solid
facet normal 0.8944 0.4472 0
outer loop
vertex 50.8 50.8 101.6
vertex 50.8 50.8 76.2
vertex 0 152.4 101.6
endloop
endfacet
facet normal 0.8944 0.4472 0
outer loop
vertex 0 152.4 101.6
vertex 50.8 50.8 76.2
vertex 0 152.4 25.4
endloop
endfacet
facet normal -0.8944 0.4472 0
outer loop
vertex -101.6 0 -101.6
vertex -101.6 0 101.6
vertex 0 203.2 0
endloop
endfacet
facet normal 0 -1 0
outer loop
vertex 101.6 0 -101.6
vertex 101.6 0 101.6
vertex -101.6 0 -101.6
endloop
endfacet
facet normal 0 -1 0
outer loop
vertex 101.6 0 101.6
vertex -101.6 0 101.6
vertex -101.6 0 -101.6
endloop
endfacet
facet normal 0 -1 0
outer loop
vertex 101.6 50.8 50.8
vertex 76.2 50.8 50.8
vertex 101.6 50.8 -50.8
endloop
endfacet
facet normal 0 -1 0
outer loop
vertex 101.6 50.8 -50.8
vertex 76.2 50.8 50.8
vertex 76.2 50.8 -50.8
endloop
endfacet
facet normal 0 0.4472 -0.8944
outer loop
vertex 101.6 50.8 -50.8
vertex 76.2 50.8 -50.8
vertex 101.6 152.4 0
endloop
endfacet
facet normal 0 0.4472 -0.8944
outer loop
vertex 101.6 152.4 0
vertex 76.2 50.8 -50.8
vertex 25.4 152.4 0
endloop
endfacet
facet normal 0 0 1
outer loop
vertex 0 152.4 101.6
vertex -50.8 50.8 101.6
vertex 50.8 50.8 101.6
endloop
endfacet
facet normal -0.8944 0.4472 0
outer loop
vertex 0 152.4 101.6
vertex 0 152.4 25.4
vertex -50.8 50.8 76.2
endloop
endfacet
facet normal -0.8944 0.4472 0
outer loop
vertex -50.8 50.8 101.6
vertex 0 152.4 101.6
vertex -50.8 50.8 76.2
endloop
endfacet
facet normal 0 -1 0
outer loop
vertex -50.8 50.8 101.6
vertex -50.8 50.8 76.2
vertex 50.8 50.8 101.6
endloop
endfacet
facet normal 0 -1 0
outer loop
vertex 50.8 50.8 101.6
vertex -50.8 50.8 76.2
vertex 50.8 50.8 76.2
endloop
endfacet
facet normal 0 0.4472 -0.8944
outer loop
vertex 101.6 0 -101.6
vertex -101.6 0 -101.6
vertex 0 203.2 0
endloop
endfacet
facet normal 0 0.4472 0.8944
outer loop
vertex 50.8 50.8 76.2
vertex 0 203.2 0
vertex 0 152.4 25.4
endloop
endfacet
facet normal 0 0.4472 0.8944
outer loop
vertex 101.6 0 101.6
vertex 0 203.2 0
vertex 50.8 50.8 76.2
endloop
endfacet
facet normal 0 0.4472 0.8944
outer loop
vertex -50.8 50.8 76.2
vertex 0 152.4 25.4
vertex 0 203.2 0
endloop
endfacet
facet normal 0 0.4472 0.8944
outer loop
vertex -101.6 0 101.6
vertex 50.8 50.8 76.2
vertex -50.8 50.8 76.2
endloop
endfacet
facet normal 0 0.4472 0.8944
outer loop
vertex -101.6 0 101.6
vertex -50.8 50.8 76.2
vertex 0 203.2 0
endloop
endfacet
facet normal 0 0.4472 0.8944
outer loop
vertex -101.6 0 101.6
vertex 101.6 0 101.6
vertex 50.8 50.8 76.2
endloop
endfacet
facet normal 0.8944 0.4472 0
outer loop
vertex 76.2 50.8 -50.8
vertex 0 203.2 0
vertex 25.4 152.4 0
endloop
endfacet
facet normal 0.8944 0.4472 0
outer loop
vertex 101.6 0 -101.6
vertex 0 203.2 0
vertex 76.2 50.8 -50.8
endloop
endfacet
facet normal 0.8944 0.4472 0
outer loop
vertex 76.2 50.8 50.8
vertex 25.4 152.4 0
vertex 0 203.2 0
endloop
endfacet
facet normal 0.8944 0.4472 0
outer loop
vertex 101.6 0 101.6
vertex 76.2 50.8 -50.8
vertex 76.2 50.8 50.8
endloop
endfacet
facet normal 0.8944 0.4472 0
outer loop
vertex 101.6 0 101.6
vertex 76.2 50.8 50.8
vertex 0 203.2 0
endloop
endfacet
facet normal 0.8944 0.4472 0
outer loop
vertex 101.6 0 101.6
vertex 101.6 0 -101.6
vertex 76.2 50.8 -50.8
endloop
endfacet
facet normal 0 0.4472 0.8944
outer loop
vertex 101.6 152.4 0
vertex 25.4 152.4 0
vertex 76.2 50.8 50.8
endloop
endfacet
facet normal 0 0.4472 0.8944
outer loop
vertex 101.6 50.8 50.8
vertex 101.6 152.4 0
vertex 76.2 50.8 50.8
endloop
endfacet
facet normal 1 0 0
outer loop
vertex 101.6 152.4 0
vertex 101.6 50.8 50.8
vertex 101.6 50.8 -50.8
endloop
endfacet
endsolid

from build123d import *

# Parameters (mm, degrees)
BOSS_EXTRUDE1_DEPTH   = 101.6
BODY_MOVE_COPY2_ANGLE = 90


with BuildPart() as part:
    # Sketch2 → Loft2 section 0
    with BuildSketch(Plane(origin=(0, 0, 0), x_dir=(1, 0, 0), z_dir=(0, 1, 0)), mode=Mode.PRIVATE) as loft2_s0:
        with BuildLine():
            Line((101.6, -101.6), (-101.6, -101.6))
            Line((-101.6, -101.6), (-101.6, 101.6))
            Line((-101.6, 101.6), (101.6, 101.6))
            Line((101.6, 101.6), (101.6, -101.6))
        make_face()
    loft([Vertex(0, 203.2, 0), loft2_s0.sketch])


with BuildPart() as body_2:
    # Sketch5 → Boss-Extrude1 (new body)
    with BuildSketch(Plane(origin=(0, 21.452394789, 0), x_dir=(1, 0, 0), z_dir=(0, 0, 1))):
        Polygon((0, 130.947605211), (-50.8, 29.347605211), (50.8, 29.347605211), align=None)
    extrude(amount=BOSS_EXTRUDE1_DEPTH)


with BuildPart() as body_3:
    # Body-Move/Copy2: copy of body 2
    add(body_2.part.rotate(Axis((0, 0, 0), (0, 1, 0)), BODY_MOVE_COPY2_ANGLE))


with BuildPart() as part_1:
    add(part.part)

    # Combine1: union body 2, body 3
    add(body_2.part)
    add(body_3.part)


solid = part_1.part
